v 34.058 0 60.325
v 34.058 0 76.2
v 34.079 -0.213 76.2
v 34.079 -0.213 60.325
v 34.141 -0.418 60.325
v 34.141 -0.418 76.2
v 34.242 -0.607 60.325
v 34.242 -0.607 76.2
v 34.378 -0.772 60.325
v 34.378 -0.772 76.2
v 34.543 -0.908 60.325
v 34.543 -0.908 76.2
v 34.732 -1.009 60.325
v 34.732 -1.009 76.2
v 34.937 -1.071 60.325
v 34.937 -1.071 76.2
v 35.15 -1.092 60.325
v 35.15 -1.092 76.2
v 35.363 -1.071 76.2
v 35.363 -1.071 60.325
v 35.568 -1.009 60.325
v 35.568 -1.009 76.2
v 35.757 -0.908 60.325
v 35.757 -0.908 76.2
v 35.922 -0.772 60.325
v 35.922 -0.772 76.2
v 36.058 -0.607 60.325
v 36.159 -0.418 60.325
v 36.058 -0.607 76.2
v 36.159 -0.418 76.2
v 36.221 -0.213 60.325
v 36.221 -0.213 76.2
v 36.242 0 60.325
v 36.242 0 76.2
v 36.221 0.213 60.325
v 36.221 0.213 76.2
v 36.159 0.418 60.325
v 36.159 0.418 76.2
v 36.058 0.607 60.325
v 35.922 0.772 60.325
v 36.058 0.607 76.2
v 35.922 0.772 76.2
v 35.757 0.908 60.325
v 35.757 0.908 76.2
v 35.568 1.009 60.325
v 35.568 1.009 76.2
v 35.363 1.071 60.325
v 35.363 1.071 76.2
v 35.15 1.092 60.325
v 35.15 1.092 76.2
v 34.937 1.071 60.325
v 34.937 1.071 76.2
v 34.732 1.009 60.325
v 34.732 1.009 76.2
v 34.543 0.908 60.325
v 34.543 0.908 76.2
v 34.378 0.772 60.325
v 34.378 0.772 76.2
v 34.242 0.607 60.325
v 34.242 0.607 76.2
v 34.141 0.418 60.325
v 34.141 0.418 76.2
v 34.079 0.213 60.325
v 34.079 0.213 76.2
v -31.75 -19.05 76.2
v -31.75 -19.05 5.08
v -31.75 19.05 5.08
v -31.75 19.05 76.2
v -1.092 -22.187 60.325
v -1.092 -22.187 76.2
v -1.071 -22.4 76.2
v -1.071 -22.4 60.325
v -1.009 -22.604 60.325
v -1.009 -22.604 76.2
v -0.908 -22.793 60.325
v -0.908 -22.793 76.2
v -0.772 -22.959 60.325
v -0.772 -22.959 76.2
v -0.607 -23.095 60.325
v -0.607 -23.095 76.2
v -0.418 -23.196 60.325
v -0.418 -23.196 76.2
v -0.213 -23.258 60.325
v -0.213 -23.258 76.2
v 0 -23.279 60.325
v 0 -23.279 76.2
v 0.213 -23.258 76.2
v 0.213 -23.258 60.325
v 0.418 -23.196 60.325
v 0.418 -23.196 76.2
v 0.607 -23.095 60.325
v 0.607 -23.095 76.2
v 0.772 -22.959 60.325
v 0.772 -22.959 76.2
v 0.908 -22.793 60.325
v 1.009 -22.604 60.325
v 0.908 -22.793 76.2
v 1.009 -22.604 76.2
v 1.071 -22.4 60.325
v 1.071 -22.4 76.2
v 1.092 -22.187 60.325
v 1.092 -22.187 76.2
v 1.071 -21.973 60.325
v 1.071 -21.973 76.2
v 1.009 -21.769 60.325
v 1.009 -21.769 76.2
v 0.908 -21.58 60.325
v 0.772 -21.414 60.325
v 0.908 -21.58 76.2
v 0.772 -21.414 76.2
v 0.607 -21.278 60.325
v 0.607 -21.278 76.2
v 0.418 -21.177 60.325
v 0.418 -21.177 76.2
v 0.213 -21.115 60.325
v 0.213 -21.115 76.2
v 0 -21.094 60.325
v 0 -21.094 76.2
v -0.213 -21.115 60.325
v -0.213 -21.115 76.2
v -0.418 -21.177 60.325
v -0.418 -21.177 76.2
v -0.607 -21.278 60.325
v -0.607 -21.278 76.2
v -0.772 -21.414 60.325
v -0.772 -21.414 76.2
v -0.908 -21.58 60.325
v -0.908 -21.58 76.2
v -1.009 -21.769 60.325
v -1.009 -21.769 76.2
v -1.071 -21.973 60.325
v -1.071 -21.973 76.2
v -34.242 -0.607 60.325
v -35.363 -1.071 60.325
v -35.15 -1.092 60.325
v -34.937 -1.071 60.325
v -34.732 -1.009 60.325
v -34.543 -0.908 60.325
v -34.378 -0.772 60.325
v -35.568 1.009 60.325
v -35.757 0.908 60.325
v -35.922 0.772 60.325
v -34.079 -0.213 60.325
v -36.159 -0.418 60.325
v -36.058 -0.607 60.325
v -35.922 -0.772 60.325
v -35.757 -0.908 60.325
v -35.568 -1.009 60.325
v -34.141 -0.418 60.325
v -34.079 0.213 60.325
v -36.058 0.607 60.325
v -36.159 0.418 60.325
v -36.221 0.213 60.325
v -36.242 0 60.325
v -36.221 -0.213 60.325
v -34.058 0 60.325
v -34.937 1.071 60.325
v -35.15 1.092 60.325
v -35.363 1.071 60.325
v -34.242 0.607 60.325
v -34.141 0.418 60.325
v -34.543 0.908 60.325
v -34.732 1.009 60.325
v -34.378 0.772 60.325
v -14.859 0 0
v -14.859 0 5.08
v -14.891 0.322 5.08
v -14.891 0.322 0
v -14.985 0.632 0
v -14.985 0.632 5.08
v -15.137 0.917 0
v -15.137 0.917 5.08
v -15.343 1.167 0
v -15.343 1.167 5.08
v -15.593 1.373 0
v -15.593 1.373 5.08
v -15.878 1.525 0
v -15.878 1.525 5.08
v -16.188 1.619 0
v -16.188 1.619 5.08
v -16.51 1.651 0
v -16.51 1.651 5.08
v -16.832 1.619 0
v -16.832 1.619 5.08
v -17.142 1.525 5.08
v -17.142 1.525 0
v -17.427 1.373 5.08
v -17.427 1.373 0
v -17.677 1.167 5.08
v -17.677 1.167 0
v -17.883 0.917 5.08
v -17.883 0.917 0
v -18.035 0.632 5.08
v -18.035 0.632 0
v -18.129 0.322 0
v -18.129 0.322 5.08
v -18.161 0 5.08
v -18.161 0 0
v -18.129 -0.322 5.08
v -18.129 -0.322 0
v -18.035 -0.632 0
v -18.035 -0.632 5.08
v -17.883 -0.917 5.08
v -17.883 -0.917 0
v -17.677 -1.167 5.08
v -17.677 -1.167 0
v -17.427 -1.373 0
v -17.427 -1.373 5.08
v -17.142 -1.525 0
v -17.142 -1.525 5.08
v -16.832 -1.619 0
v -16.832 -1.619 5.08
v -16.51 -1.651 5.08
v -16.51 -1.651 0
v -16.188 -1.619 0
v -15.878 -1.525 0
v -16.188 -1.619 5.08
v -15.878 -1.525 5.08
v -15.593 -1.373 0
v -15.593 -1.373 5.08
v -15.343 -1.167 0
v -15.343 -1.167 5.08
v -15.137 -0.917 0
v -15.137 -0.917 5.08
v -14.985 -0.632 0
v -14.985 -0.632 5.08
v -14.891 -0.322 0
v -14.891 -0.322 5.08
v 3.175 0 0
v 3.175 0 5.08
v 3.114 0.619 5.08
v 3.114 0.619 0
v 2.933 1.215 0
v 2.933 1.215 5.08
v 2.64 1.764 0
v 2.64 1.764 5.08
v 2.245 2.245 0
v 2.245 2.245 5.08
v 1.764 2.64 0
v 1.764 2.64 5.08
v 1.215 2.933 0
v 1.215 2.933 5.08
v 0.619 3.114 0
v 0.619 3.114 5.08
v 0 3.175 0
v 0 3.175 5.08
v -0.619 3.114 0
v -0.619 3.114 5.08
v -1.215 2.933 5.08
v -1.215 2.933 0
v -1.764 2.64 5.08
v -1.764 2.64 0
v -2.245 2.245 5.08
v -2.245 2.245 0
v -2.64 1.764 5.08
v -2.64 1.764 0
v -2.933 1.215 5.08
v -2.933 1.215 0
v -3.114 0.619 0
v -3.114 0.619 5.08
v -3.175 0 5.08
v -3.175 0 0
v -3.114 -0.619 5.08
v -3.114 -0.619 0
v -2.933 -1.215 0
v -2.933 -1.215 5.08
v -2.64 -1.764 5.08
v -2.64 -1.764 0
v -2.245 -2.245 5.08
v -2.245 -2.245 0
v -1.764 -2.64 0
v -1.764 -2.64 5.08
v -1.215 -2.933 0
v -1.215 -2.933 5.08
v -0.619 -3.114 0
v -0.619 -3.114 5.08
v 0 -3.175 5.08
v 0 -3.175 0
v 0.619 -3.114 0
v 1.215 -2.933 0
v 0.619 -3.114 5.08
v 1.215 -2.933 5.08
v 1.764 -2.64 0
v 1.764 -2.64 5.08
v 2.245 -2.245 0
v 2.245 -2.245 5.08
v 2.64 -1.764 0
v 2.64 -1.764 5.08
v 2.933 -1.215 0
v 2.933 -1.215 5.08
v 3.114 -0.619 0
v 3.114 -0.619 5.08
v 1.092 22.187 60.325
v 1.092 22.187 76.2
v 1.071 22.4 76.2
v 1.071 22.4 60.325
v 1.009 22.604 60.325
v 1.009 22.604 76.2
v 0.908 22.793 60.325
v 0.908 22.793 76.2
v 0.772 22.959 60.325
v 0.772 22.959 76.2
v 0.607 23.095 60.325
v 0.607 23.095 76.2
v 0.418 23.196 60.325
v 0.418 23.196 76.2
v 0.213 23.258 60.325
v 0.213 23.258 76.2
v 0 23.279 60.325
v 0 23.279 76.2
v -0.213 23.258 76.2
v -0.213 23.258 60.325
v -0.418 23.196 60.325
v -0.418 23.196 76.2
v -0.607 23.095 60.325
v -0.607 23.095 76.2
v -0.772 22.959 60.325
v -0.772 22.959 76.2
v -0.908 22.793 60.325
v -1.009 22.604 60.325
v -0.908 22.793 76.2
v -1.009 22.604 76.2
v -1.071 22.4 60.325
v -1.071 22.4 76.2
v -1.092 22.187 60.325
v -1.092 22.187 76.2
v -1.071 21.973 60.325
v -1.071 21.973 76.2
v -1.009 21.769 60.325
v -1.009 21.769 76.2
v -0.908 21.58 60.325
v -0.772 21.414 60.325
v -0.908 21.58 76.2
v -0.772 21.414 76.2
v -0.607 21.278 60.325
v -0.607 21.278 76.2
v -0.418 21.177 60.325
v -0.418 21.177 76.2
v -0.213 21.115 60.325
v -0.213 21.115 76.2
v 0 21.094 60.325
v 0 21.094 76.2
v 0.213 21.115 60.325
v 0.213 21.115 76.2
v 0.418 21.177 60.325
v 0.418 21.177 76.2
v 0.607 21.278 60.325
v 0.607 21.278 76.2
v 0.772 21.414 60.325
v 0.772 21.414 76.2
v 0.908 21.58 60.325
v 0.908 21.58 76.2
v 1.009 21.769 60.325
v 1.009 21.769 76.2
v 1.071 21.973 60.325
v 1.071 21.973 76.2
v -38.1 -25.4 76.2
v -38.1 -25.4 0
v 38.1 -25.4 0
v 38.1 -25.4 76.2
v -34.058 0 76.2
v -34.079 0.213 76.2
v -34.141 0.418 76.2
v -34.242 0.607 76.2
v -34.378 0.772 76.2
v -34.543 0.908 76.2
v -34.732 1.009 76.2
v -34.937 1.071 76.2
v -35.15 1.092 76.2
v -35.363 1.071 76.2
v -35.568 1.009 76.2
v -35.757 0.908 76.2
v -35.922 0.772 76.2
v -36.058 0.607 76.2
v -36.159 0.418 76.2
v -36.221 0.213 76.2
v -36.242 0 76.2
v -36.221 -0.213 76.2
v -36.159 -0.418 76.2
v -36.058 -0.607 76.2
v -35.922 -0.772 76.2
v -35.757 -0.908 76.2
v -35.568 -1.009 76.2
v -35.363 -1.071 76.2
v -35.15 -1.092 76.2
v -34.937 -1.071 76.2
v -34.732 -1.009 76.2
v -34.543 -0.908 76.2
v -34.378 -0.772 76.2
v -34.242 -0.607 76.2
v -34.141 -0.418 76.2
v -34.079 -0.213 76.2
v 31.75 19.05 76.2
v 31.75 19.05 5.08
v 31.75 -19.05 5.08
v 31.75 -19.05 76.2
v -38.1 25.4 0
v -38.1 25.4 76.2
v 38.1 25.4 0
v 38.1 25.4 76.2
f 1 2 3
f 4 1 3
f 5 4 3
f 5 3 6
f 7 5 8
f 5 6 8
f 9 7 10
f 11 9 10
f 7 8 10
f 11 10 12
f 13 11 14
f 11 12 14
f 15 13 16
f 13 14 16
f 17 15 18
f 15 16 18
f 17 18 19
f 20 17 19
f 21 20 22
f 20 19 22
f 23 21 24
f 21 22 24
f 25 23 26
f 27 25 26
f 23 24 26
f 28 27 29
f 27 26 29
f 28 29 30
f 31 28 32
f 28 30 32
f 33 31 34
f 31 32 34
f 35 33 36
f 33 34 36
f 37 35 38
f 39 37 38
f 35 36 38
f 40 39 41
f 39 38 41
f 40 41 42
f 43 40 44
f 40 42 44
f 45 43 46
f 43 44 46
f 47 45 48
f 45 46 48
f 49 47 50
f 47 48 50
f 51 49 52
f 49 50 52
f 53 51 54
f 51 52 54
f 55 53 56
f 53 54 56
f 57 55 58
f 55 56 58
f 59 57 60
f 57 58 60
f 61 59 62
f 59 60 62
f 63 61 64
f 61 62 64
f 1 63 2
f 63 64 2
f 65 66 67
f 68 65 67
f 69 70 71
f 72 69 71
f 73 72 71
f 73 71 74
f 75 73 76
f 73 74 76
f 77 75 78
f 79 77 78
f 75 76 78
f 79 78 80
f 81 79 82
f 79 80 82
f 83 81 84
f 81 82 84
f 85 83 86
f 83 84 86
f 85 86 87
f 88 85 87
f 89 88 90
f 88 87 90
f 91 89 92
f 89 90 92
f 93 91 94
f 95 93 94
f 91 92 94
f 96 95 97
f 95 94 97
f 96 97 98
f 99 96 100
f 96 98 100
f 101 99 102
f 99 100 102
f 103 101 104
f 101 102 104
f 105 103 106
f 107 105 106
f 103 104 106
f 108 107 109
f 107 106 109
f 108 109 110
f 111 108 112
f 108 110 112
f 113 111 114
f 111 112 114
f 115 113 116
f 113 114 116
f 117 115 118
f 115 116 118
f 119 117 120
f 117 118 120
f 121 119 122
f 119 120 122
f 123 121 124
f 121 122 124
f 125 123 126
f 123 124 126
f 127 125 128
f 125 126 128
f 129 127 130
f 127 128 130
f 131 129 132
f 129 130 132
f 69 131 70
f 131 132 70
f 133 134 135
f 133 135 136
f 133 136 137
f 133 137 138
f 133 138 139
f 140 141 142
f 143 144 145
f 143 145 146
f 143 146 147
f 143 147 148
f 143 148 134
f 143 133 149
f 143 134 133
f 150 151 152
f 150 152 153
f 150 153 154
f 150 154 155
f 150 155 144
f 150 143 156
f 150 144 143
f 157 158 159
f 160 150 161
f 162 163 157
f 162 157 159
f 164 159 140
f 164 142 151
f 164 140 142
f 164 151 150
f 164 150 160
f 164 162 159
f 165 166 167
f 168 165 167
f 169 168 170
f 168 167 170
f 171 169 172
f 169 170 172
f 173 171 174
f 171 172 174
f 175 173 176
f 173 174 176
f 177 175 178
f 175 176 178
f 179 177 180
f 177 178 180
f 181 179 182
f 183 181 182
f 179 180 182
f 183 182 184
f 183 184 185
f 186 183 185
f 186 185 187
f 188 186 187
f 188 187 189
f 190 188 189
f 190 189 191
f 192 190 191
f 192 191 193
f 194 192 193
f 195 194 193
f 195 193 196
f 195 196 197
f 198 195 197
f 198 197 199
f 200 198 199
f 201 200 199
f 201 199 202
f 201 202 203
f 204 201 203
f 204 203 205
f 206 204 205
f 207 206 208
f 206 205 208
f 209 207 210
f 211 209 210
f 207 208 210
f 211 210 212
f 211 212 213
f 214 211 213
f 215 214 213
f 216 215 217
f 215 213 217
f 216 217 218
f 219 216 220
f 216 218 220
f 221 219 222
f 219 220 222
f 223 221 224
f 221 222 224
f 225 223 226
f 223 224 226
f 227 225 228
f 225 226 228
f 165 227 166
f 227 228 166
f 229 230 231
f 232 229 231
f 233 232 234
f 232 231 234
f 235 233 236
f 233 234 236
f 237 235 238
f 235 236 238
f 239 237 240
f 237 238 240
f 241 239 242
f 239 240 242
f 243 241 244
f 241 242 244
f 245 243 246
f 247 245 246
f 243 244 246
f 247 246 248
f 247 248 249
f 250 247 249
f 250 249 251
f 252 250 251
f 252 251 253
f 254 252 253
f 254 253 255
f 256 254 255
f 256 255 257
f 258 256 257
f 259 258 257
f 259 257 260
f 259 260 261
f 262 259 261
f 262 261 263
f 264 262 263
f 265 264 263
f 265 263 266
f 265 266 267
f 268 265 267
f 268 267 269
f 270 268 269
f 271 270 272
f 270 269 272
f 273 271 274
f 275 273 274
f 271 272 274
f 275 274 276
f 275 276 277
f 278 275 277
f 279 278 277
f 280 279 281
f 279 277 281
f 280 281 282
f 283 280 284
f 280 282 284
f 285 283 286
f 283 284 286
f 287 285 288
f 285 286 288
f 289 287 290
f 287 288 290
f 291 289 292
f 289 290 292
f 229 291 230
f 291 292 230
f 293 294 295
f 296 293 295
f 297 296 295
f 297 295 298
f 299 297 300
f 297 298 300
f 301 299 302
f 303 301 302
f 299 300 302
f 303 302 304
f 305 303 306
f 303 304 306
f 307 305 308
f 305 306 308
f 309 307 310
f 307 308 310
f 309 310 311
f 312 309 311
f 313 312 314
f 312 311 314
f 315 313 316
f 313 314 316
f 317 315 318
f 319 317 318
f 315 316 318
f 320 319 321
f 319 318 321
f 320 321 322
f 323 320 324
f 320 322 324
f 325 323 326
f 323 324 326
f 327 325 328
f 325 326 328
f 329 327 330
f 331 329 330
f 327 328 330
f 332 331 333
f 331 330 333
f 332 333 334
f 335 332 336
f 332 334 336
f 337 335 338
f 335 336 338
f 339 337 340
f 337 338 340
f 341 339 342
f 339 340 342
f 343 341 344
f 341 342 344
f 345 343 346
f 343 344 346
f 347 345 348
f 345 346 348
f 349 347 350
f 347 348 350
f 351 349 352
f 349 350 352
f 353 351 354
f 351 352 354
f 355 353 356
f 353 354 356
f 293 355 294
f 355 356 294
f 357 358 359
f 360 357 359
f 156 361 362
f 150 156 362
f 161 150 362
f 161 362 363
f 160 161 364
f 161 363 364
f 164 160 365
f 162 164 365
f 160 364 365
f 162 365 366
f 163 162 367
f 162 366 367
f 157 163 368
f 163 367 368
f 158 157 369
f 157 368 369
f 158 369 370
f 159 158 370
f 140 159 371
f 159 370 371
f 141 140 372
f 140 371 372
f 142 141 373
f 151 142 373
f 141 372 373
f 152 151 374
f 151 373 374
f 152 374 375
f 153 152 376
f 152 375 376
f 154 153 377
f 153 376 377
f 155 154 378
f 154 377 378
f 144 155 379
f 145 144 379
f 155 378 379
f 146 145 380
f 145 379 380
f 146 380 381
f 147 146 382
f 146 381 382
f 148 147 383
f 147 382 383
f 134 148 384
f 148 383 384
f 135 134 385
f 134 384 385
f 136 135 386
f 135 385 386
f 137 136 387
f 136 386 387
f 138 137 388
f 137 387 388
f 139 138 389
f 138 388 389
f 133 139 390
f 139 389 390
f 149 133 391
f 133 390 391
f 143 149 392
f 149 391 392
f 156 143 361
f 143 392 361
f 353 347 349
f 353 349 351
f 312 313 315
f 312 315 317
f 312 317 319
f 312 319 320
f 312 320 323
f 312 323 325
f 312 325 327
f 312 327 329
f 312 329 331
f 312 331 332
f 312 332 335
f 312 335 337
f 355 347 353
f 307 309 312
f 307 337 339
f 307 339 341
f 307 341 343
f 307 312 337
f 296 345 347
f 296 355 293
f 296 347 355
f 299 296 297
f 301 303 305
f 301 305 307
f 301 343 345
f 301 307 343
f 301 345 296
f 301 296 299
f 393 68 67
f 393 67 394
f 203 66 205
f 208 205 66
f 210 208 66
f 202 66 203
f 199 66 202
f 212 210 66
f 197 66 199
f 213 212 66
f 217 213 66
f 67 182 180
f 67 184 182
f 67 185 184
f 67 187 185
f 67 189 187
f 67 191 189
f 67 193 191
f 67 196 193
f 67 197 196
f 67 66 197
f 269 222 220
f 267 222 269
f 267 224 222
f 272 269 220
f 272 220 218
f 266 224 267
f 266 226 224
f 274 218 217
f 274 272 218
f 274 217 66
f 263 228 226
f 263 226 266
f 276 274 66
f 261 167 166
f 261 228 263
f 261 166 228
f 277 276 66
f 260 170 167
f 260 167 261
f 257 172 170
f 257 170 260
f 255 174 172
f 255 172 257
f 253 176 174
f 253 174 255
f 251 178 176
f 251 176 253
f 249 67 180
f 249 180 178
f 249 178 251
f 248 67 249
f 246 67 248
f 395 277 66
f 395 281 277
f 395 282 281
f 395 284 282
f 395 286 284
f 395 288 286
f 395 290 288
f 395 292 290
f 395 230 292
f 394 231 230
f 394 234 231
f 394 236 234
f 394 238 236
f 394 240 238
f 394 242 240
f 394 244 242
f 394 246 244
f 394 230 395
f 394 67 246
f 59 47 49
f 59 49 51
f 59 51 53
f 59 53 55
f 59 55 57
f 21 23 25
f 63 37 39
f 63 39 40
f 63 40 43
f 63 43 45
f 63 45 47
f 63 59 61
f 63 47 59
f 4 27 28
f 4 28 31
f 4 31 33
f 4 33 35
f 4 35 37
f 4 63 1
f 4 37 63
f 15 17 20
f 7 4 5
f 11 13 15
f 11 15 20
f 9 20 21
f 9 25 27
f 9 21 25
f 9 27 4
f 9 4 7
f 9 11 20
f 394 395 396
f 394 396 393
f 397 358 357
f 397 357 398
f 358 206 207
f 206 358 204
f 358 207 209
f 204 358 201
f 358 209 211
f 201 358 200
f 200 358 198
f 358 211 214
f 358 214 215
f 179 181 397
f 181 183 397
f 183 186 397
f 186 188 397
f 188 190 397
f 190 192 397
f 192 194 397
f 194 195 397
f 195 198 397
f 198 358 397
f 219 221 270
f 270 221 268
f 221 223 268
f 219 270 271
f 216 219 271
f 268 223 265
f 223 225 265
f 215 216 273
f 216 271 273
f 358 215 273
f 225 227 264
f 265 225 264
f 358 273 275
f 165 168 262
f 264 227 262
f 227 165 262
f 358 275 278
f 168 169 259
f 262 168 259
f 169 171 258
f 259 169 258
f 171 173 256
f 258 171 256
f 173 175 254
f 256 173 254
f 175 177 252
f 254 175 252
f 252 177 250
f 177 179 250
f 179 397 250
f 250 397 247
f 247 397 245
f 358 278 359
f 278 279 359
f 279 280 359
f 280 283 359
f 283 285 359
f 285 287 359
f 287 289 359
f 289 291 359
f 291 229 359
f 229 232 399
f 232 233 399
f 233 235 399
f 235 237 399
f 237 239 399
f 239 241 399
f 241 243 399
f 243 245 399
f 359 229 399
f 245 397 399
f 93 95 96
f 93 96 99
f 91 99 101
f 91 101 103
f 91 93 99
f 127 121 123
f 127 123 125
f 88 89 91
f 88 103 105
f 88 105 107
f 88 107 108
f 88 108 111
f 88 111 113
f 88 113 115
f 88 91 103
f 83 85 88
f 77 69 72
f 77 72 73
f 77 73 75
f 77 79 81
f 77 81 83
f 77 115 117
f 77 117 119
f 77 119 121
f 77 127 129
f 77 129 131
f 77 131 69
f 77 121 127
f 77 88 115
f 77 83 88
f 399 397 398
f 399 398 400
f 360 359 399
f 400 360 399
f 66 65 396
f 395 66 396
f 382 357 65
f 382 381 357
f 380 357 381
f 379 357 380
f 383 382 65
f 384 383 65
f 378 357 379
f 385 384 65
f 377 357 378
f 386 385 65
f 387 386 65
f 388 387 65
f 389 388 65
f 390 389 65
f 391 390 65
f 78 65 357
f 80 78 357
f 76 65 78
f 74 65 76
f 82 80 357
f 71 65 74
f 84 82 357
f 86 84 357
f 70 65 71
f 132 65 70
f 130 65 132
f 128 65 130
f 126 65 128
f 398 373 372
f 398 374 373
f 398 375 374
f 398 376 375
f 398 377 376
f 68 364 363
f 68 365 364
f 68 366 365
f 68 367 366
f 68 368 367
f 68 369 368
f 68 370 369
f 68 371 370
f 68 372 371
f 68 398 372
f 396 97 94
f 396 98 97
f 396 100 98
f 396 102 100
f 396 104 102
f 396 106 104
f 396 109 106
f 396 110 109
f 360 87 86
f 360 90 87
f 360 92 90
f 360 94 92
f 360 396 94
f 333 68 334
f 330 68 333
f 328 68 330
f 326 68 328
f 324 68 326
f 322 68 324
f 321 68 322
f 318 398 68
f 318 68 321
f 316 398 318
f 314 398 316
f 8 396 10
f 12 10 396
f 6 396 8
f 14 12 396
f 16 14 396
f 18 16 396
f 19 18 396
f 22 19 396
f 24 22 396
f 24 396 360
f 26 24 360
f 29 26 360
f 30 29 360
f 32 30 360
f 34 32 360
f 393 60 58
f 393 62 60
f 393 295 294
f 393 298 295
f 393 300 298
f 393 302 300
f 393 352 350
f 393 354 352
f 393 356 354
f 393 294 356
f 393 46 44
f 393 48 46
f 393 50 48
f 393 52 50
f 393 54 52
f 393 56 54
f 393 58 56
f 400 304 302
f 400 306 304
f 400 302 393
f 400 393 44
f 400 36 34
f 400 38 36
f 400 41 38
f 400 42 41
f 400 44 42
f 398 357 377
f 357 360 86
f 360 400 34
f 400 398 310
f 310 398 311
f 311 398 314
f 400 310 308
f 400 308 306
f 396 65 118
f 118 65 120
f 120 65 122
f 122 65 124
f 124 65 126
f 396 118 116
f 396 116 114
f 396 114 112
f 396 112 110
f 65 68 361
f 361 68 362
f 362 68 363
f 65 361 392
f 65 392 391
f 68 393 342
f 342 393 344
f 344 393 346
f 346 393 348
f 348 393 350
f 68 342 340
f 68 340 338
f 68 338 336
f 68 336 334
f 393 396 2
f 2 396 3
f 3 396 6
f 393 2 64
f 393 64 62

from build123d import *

# Parameters (mm, degrees)
SKETCH1_W           = 76.2
SKETCH1_H           = 50.8
BOSS_EXTRUDE1_DEPTH = 76.2
SKETCH2_W           = 63.5
SKETCH2_H           = 38.1
CUT_EXTRUDE1_DEPTH  = 71.12
SKETCH3_R           = 3.175
SKETCH3_R_2         = 1.651
CUT_EXTRUDE2_DEPTH  = 48.26
SKETCH4_R           = 1.0922
CUT_EXTRUDE3_DEPTH  = 15.875


with BuildPart() as part:
    # Sketch1 → Boss-Extrude1 (new body)
    with BuildSketch(Plane.XY):
        Rectangle(SKETCH1_W, SKETCH1_H)
    extrude(amount=BOSS_EXTRUDE1_DEPTH)

    # Sketch2 → Cut-Extrude1 (cut)
    with BuildSketch(Plane.XY.offset(76.2)):
        Rectangle(SKETCH2_W, SKETCH2_H)
    extrude(amount=-CUT_EXTRUDE1_DEPTH, mode=Mode.SUBTRACT)

    # Sketch3 → Cut-Extrude2 (cut)
    with BuildSketch(Plane.XY.offset(5.08)):
        Circle(SKETCH3_R)
        with Locations((-16.51, 0)):
            Circle(SKETCH3_R_2)
    extrude(amount=-CUT_EXTRUDE2_DEPTH, mode=Mode.SUBTRACT)

    # Sketch4 → Cut-Extrude3 (cut)
    with BuildSketch(Plane.XY.offset(76.2)):
        with Locations((-35.149835373, 0)):
            Circle(SKETCH4_R)
        with Locations(Location((35.149835373, 0, 0), (0, 0, 180))):
            Circle(SKETCH4_R)
        with Locations((0, 22.186517988)):
            Circle(SKETCH4_R)
        with Locations(Location((0, -22.186517988, 0), (0, 0, 180))):
            Circle(SKETCH4_R)
    extrude(amount=-CUT_EXTRUDE3_DEPTH, mode=Mode.SUBTRACT)


solid = part.part
